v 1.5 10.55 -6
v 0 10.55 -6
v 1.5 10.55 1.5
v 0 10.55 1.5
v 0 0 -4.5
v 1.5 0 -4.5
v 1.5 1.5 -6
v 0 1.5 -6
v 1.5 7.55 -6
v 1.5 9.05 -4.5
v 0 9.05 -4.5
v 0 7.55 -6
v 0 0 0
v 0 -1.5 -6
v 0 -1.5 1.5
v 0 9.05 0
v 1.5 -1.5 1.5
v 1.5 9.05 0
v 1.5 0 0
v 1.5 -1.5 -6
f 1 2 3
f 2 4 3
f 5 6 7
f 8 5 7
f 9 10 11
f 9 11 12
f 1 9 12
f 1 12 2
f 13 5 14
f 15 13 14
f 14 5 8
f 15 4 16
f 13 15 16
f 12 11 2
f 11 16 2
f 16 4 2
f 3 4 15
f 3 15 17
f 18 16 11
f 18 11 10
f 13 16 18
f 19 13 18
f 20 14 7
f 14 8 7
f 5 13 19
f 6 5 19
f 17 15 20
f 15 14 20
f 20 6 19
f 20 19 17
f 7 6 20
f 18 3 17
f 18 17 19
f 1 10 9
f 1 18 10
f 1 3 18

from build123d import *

# Parameters (mm, degrees)
SKETCH1_W           = 1.5
SKETCH1_H           = 9.05
SKETCH1_H_2         = 1.5
BOSS_EXTRUDE1_DEPTH = 1.5
SKETCH1_3_W         = 1.5
SKETCH1_3_H         = 1.5
BOSS_EXTRUDE2_DEPTH = 6
BOSS_EXTRUDE3_DEPTH = 1.5


with BuildPart() as part:
    # Sketch1 → Boss-Extrude1 (new body)
    with BuildSketch(Plane.XY):
        with Locations((0.75, 4.525)):
            Rectangle(SKETCH1_W, SKETCH1_H)
        with Locations((0.75, 9.8)):
            Rectangle(SKETCH1_W, SKETCH1_H_2)
        with Locations((0.75, -0.75)):
            Rectangle(SKETCH1_W, SKETCH1_H_2)
    extrude(amount=BOSS_EXTRUDE1_DEPTH)

    # Sketch1<3> → Boss-Extrude2 (add)
    with BuildSketch(Plane.XY):
        with Locations((0.75, 9.8)):
            Rectangle(SKETCH1_3_W, SKETCH1_3_H)
        with Locations((0.75, -0.75)):
            Rectangle(SKETCH1_3_W, SKETCH1_3_H)
    extrude(amount=-BOSS_EXTRUDE2_DEPTH)

    # Sketch2 → Boss-Extrude3 (add)
    with BuildSketch(Plane(origin=(1.5, 0, 0), x_dir=(0, 0, -1), z_dir=(1, 0, 0))):
        Polygon((4.5, 9.05), (6, 7.55), (6, 9.05), align=None)
        Polygon((6, 0), (4.5, 0), (6, 1.5), align=None)
    extrude(amount=-BOSS_EXTRUDE3_DEPTH)


solid = part.part
